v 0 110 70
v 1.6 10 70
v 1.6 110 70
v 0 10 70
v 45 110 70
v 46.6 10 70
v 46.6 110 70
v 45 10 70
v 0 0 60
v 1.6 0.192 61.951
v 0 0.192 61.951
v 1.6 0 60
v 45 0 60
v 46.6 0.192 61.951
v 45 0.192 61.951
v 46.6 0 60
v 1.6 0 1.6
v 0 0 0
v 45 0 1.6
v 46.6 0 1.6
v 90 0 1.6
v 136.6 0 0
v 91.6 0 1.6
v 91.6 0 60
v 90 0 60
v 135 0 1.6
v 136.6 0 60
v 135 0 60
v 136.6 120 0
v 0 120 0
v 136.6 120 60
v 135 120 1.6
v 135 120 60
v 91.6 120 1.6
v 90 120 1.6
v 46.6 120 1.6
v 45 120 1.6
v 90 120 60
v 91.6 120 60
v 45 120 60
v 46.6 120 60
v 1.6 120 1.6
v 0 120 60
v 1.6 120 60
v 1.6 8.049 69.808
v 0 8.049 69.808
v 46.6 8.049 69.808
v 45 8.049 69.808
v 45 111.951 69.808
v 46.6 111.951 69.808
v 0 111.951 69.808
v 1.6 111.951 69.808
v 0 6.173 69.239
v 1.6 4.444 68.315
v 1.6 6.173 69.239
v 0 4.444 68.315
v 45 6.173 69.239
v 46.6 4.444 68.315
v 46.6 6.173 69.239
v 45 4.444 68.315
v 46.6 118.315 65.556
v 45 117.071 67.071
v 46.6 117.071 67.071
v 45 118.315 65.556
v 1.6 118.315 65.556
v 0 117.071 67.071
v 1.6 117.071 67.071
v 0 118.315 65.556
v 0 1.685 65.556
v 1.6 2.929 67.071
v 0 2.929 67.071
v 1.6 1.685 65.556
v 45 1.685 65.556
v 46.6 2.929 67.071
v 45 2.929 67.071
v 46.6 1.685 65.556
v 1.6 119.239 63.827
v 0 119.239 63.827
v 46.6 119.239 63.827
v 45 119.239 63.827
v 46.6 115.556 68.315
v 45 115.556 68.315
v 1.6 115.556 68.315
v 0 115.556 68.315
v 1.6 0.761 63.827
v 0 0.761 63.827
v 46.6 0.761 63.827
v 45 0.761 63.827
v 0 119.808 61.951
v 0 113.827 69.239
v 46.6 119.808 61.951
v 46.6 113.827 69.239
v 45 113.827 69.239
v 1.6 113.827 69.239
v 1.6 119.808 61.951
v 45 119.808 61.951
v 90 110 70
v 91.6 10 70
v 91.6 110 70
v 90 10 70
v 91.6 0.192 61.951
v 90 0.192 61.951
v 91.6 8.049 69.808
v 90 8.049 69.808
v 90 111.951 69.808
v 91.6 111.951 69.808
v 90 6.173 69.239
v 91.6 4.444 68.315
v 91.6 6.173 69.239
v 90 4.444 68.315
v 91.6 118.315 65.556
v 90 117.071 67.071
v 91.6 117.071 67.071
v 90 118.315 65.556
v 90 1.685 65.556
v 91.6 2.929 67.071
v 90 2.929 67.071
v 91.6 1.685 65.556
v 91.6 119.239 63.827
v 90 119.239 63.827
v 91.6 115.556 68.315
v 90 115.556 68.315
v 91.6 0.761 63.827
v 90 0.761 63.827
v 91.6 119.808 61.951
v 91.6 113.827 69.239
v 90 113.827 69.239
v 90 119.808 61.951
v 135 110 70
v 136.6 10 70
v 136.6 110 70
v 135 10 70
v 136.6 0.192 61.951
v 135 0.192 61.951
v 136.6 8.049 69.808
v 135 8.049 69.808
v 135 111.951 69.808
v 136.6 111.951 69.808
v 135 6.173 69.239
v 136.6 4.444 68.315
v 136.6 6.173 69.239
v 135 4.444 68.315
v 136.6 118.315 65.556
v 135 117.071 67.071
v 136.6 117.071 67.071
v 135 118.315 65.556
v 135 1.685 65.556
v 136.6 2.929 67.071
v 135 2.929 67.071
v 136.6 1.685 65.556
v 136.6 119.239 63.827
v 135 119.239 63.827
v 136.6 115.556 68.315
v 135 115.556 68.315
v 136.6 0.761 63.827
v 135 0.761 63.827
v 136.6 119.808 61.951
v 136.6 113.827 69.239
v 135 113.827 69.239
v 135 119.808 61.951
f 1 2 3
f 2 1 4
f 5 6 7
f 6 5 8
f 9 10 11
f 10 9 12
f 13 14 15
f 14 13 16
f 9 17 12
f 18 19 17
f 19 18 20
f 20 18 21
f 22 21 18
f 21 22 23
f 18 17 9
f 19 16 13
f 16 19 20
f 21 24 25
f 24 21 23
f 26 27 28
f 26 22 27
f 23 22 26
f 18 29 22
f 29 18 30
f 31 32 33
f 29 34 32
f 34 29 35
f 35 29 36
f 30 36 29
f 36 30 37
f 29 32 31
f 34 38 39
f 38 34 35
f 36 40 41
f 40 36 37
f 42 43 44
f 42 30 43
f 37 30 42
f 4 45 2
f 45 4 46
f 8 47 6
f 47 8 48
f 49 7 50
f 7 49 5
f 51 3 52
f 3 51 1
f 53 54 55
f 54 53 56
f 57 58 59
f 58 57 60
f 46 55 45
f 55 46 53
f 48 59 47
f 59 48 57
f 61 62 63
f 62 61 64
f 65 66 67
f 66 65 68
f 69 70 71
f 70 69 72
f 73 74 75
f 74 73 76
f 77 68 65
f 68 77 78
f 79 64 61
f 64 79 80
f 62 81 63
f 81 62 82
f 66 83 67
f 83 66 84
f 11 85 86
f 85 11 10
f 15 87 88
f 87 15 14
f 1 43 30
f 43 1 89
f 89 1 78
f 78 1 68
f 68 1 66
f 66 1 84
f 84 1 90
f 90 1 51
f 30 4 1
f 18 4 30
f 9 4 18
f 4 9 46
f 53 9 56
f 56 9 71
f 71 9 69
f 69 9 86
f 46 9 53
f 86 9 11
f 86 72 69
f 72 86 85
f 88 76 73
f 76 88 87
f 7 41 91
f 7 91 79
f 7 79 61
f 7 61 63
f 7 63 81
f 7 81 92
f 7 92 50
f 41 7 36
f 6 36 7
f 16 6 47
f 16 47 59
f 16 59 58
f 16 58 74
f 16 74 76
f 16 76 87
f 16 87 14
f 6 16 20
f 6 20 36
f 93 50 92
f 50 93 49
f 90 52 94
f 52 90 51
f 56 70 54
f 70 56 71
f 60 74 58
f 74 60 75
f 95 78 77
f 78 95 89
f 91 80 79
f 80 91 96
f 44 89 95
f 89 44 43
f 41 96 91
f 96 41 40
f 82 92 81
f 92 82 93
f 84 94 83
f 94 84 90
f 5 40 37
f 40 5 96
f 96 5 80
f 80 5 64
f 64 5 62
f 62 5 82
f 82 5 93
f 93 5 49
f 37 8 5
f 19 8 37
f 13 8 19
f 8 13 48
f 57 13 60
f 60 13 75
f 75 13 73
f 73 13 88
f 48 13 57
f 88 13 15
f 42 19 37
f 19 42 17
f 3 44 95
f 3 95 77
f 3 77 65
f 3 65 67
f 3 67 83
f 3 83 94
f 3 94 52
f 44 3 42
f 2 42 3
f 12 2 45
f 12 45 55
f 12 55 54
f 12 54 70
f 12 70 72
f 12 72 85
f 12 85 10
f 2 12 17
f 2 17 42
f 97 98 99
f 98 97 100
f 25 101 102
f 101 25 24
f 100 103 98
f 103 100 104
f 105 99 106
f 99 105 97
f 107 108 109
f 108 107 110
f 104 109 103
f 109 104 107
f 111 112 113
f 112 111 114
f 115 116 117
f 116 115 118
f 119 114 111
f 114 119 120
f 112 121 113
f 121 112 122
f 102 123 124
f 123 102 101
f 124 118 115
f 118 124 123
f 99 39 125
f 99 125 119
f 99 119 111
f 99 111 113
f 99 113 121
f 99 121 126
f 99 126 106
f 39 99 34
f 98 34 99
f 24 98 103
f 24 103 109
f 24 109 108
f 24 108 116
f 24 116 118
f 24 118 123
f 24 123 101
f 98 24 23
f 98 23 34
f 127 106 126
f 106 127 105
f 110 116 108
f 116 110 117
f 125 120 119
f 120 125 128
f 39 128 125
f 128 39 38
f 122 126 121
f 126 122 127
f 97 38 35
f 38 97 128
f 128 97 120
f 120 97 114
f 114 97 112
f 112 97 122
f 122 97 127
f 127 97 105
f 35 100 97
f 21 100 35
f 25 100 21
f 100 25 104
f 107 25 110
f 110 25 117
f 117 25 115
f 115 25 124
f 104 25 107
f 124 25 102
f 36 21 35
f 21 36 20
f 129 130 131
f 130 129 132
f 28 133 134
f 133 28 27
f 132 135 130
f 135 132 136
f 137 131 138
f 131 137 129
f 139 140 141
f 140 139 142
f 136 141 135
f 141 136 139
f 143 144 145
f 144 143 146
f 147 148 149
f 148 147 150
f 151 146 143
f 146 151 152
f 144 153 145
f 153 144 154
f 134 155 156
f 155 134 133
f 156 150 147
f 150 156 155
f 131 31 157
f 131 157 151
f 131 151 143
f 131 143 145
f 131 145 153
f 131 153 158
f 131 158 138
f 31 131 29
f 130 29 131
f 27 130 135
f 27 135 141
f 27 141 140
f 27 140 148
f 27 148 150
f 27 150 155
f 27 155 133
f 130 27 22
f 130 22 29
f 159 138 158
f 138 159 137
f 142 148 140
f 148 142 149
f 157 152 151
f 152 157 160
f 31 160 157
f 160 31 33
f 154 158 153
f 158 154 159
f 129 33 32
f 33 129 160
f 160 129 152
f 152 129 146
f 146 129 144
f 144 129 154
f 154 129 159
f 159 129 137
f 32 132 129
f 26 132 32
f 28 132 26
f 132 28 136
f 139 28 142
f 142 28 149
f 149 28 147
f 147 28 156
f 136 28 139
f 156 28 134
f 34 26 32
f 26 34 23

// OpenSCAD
Wunit = 45;
D = 120;
H = 70;
R = 10;
thick = 1.6;

for (x = [0, Wunit, Wunit * 2]) {
    translate([x, 0, 0]) {
        difference() {
            hull() {
                cube([Wunit + thick, D, 1]);
                for (y = [R, D - R])
                    translate([0, y, H - R])
                        rotate([0, 90, 0])
                            cylinder(r = R, h = Wunit + thick, $fn = 32);
            }
            translate([thick, 0, thick])
                cube([Wunit - thick, D, H]);
        }
    }
}
